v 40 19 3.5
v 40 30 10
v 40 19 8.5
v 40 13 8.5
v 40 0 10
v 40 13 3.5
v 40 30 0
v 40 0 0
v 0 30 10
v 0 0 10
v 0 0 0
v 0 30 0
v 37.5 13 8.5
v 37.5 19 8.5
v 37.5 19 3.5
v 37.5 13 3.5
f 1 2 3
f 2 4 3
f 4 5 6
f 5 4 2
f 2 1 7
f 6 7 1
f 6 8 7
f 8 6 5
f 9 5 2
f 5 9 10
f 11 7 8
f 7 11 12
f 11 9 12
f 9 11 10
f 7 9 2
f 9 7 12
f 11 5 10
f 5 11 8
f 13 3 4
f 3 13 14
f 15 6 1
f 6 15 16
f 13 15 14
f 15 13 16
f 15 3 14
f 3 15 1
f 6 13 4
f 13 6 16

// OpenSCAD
// units=mm — generated by scad_emitter.py
// part=unnamed
$fn = 48;

difference() { cube([40, 30, 10]); translate([37.5, 13, 3.5]) cube([3, 6, 5]); }
